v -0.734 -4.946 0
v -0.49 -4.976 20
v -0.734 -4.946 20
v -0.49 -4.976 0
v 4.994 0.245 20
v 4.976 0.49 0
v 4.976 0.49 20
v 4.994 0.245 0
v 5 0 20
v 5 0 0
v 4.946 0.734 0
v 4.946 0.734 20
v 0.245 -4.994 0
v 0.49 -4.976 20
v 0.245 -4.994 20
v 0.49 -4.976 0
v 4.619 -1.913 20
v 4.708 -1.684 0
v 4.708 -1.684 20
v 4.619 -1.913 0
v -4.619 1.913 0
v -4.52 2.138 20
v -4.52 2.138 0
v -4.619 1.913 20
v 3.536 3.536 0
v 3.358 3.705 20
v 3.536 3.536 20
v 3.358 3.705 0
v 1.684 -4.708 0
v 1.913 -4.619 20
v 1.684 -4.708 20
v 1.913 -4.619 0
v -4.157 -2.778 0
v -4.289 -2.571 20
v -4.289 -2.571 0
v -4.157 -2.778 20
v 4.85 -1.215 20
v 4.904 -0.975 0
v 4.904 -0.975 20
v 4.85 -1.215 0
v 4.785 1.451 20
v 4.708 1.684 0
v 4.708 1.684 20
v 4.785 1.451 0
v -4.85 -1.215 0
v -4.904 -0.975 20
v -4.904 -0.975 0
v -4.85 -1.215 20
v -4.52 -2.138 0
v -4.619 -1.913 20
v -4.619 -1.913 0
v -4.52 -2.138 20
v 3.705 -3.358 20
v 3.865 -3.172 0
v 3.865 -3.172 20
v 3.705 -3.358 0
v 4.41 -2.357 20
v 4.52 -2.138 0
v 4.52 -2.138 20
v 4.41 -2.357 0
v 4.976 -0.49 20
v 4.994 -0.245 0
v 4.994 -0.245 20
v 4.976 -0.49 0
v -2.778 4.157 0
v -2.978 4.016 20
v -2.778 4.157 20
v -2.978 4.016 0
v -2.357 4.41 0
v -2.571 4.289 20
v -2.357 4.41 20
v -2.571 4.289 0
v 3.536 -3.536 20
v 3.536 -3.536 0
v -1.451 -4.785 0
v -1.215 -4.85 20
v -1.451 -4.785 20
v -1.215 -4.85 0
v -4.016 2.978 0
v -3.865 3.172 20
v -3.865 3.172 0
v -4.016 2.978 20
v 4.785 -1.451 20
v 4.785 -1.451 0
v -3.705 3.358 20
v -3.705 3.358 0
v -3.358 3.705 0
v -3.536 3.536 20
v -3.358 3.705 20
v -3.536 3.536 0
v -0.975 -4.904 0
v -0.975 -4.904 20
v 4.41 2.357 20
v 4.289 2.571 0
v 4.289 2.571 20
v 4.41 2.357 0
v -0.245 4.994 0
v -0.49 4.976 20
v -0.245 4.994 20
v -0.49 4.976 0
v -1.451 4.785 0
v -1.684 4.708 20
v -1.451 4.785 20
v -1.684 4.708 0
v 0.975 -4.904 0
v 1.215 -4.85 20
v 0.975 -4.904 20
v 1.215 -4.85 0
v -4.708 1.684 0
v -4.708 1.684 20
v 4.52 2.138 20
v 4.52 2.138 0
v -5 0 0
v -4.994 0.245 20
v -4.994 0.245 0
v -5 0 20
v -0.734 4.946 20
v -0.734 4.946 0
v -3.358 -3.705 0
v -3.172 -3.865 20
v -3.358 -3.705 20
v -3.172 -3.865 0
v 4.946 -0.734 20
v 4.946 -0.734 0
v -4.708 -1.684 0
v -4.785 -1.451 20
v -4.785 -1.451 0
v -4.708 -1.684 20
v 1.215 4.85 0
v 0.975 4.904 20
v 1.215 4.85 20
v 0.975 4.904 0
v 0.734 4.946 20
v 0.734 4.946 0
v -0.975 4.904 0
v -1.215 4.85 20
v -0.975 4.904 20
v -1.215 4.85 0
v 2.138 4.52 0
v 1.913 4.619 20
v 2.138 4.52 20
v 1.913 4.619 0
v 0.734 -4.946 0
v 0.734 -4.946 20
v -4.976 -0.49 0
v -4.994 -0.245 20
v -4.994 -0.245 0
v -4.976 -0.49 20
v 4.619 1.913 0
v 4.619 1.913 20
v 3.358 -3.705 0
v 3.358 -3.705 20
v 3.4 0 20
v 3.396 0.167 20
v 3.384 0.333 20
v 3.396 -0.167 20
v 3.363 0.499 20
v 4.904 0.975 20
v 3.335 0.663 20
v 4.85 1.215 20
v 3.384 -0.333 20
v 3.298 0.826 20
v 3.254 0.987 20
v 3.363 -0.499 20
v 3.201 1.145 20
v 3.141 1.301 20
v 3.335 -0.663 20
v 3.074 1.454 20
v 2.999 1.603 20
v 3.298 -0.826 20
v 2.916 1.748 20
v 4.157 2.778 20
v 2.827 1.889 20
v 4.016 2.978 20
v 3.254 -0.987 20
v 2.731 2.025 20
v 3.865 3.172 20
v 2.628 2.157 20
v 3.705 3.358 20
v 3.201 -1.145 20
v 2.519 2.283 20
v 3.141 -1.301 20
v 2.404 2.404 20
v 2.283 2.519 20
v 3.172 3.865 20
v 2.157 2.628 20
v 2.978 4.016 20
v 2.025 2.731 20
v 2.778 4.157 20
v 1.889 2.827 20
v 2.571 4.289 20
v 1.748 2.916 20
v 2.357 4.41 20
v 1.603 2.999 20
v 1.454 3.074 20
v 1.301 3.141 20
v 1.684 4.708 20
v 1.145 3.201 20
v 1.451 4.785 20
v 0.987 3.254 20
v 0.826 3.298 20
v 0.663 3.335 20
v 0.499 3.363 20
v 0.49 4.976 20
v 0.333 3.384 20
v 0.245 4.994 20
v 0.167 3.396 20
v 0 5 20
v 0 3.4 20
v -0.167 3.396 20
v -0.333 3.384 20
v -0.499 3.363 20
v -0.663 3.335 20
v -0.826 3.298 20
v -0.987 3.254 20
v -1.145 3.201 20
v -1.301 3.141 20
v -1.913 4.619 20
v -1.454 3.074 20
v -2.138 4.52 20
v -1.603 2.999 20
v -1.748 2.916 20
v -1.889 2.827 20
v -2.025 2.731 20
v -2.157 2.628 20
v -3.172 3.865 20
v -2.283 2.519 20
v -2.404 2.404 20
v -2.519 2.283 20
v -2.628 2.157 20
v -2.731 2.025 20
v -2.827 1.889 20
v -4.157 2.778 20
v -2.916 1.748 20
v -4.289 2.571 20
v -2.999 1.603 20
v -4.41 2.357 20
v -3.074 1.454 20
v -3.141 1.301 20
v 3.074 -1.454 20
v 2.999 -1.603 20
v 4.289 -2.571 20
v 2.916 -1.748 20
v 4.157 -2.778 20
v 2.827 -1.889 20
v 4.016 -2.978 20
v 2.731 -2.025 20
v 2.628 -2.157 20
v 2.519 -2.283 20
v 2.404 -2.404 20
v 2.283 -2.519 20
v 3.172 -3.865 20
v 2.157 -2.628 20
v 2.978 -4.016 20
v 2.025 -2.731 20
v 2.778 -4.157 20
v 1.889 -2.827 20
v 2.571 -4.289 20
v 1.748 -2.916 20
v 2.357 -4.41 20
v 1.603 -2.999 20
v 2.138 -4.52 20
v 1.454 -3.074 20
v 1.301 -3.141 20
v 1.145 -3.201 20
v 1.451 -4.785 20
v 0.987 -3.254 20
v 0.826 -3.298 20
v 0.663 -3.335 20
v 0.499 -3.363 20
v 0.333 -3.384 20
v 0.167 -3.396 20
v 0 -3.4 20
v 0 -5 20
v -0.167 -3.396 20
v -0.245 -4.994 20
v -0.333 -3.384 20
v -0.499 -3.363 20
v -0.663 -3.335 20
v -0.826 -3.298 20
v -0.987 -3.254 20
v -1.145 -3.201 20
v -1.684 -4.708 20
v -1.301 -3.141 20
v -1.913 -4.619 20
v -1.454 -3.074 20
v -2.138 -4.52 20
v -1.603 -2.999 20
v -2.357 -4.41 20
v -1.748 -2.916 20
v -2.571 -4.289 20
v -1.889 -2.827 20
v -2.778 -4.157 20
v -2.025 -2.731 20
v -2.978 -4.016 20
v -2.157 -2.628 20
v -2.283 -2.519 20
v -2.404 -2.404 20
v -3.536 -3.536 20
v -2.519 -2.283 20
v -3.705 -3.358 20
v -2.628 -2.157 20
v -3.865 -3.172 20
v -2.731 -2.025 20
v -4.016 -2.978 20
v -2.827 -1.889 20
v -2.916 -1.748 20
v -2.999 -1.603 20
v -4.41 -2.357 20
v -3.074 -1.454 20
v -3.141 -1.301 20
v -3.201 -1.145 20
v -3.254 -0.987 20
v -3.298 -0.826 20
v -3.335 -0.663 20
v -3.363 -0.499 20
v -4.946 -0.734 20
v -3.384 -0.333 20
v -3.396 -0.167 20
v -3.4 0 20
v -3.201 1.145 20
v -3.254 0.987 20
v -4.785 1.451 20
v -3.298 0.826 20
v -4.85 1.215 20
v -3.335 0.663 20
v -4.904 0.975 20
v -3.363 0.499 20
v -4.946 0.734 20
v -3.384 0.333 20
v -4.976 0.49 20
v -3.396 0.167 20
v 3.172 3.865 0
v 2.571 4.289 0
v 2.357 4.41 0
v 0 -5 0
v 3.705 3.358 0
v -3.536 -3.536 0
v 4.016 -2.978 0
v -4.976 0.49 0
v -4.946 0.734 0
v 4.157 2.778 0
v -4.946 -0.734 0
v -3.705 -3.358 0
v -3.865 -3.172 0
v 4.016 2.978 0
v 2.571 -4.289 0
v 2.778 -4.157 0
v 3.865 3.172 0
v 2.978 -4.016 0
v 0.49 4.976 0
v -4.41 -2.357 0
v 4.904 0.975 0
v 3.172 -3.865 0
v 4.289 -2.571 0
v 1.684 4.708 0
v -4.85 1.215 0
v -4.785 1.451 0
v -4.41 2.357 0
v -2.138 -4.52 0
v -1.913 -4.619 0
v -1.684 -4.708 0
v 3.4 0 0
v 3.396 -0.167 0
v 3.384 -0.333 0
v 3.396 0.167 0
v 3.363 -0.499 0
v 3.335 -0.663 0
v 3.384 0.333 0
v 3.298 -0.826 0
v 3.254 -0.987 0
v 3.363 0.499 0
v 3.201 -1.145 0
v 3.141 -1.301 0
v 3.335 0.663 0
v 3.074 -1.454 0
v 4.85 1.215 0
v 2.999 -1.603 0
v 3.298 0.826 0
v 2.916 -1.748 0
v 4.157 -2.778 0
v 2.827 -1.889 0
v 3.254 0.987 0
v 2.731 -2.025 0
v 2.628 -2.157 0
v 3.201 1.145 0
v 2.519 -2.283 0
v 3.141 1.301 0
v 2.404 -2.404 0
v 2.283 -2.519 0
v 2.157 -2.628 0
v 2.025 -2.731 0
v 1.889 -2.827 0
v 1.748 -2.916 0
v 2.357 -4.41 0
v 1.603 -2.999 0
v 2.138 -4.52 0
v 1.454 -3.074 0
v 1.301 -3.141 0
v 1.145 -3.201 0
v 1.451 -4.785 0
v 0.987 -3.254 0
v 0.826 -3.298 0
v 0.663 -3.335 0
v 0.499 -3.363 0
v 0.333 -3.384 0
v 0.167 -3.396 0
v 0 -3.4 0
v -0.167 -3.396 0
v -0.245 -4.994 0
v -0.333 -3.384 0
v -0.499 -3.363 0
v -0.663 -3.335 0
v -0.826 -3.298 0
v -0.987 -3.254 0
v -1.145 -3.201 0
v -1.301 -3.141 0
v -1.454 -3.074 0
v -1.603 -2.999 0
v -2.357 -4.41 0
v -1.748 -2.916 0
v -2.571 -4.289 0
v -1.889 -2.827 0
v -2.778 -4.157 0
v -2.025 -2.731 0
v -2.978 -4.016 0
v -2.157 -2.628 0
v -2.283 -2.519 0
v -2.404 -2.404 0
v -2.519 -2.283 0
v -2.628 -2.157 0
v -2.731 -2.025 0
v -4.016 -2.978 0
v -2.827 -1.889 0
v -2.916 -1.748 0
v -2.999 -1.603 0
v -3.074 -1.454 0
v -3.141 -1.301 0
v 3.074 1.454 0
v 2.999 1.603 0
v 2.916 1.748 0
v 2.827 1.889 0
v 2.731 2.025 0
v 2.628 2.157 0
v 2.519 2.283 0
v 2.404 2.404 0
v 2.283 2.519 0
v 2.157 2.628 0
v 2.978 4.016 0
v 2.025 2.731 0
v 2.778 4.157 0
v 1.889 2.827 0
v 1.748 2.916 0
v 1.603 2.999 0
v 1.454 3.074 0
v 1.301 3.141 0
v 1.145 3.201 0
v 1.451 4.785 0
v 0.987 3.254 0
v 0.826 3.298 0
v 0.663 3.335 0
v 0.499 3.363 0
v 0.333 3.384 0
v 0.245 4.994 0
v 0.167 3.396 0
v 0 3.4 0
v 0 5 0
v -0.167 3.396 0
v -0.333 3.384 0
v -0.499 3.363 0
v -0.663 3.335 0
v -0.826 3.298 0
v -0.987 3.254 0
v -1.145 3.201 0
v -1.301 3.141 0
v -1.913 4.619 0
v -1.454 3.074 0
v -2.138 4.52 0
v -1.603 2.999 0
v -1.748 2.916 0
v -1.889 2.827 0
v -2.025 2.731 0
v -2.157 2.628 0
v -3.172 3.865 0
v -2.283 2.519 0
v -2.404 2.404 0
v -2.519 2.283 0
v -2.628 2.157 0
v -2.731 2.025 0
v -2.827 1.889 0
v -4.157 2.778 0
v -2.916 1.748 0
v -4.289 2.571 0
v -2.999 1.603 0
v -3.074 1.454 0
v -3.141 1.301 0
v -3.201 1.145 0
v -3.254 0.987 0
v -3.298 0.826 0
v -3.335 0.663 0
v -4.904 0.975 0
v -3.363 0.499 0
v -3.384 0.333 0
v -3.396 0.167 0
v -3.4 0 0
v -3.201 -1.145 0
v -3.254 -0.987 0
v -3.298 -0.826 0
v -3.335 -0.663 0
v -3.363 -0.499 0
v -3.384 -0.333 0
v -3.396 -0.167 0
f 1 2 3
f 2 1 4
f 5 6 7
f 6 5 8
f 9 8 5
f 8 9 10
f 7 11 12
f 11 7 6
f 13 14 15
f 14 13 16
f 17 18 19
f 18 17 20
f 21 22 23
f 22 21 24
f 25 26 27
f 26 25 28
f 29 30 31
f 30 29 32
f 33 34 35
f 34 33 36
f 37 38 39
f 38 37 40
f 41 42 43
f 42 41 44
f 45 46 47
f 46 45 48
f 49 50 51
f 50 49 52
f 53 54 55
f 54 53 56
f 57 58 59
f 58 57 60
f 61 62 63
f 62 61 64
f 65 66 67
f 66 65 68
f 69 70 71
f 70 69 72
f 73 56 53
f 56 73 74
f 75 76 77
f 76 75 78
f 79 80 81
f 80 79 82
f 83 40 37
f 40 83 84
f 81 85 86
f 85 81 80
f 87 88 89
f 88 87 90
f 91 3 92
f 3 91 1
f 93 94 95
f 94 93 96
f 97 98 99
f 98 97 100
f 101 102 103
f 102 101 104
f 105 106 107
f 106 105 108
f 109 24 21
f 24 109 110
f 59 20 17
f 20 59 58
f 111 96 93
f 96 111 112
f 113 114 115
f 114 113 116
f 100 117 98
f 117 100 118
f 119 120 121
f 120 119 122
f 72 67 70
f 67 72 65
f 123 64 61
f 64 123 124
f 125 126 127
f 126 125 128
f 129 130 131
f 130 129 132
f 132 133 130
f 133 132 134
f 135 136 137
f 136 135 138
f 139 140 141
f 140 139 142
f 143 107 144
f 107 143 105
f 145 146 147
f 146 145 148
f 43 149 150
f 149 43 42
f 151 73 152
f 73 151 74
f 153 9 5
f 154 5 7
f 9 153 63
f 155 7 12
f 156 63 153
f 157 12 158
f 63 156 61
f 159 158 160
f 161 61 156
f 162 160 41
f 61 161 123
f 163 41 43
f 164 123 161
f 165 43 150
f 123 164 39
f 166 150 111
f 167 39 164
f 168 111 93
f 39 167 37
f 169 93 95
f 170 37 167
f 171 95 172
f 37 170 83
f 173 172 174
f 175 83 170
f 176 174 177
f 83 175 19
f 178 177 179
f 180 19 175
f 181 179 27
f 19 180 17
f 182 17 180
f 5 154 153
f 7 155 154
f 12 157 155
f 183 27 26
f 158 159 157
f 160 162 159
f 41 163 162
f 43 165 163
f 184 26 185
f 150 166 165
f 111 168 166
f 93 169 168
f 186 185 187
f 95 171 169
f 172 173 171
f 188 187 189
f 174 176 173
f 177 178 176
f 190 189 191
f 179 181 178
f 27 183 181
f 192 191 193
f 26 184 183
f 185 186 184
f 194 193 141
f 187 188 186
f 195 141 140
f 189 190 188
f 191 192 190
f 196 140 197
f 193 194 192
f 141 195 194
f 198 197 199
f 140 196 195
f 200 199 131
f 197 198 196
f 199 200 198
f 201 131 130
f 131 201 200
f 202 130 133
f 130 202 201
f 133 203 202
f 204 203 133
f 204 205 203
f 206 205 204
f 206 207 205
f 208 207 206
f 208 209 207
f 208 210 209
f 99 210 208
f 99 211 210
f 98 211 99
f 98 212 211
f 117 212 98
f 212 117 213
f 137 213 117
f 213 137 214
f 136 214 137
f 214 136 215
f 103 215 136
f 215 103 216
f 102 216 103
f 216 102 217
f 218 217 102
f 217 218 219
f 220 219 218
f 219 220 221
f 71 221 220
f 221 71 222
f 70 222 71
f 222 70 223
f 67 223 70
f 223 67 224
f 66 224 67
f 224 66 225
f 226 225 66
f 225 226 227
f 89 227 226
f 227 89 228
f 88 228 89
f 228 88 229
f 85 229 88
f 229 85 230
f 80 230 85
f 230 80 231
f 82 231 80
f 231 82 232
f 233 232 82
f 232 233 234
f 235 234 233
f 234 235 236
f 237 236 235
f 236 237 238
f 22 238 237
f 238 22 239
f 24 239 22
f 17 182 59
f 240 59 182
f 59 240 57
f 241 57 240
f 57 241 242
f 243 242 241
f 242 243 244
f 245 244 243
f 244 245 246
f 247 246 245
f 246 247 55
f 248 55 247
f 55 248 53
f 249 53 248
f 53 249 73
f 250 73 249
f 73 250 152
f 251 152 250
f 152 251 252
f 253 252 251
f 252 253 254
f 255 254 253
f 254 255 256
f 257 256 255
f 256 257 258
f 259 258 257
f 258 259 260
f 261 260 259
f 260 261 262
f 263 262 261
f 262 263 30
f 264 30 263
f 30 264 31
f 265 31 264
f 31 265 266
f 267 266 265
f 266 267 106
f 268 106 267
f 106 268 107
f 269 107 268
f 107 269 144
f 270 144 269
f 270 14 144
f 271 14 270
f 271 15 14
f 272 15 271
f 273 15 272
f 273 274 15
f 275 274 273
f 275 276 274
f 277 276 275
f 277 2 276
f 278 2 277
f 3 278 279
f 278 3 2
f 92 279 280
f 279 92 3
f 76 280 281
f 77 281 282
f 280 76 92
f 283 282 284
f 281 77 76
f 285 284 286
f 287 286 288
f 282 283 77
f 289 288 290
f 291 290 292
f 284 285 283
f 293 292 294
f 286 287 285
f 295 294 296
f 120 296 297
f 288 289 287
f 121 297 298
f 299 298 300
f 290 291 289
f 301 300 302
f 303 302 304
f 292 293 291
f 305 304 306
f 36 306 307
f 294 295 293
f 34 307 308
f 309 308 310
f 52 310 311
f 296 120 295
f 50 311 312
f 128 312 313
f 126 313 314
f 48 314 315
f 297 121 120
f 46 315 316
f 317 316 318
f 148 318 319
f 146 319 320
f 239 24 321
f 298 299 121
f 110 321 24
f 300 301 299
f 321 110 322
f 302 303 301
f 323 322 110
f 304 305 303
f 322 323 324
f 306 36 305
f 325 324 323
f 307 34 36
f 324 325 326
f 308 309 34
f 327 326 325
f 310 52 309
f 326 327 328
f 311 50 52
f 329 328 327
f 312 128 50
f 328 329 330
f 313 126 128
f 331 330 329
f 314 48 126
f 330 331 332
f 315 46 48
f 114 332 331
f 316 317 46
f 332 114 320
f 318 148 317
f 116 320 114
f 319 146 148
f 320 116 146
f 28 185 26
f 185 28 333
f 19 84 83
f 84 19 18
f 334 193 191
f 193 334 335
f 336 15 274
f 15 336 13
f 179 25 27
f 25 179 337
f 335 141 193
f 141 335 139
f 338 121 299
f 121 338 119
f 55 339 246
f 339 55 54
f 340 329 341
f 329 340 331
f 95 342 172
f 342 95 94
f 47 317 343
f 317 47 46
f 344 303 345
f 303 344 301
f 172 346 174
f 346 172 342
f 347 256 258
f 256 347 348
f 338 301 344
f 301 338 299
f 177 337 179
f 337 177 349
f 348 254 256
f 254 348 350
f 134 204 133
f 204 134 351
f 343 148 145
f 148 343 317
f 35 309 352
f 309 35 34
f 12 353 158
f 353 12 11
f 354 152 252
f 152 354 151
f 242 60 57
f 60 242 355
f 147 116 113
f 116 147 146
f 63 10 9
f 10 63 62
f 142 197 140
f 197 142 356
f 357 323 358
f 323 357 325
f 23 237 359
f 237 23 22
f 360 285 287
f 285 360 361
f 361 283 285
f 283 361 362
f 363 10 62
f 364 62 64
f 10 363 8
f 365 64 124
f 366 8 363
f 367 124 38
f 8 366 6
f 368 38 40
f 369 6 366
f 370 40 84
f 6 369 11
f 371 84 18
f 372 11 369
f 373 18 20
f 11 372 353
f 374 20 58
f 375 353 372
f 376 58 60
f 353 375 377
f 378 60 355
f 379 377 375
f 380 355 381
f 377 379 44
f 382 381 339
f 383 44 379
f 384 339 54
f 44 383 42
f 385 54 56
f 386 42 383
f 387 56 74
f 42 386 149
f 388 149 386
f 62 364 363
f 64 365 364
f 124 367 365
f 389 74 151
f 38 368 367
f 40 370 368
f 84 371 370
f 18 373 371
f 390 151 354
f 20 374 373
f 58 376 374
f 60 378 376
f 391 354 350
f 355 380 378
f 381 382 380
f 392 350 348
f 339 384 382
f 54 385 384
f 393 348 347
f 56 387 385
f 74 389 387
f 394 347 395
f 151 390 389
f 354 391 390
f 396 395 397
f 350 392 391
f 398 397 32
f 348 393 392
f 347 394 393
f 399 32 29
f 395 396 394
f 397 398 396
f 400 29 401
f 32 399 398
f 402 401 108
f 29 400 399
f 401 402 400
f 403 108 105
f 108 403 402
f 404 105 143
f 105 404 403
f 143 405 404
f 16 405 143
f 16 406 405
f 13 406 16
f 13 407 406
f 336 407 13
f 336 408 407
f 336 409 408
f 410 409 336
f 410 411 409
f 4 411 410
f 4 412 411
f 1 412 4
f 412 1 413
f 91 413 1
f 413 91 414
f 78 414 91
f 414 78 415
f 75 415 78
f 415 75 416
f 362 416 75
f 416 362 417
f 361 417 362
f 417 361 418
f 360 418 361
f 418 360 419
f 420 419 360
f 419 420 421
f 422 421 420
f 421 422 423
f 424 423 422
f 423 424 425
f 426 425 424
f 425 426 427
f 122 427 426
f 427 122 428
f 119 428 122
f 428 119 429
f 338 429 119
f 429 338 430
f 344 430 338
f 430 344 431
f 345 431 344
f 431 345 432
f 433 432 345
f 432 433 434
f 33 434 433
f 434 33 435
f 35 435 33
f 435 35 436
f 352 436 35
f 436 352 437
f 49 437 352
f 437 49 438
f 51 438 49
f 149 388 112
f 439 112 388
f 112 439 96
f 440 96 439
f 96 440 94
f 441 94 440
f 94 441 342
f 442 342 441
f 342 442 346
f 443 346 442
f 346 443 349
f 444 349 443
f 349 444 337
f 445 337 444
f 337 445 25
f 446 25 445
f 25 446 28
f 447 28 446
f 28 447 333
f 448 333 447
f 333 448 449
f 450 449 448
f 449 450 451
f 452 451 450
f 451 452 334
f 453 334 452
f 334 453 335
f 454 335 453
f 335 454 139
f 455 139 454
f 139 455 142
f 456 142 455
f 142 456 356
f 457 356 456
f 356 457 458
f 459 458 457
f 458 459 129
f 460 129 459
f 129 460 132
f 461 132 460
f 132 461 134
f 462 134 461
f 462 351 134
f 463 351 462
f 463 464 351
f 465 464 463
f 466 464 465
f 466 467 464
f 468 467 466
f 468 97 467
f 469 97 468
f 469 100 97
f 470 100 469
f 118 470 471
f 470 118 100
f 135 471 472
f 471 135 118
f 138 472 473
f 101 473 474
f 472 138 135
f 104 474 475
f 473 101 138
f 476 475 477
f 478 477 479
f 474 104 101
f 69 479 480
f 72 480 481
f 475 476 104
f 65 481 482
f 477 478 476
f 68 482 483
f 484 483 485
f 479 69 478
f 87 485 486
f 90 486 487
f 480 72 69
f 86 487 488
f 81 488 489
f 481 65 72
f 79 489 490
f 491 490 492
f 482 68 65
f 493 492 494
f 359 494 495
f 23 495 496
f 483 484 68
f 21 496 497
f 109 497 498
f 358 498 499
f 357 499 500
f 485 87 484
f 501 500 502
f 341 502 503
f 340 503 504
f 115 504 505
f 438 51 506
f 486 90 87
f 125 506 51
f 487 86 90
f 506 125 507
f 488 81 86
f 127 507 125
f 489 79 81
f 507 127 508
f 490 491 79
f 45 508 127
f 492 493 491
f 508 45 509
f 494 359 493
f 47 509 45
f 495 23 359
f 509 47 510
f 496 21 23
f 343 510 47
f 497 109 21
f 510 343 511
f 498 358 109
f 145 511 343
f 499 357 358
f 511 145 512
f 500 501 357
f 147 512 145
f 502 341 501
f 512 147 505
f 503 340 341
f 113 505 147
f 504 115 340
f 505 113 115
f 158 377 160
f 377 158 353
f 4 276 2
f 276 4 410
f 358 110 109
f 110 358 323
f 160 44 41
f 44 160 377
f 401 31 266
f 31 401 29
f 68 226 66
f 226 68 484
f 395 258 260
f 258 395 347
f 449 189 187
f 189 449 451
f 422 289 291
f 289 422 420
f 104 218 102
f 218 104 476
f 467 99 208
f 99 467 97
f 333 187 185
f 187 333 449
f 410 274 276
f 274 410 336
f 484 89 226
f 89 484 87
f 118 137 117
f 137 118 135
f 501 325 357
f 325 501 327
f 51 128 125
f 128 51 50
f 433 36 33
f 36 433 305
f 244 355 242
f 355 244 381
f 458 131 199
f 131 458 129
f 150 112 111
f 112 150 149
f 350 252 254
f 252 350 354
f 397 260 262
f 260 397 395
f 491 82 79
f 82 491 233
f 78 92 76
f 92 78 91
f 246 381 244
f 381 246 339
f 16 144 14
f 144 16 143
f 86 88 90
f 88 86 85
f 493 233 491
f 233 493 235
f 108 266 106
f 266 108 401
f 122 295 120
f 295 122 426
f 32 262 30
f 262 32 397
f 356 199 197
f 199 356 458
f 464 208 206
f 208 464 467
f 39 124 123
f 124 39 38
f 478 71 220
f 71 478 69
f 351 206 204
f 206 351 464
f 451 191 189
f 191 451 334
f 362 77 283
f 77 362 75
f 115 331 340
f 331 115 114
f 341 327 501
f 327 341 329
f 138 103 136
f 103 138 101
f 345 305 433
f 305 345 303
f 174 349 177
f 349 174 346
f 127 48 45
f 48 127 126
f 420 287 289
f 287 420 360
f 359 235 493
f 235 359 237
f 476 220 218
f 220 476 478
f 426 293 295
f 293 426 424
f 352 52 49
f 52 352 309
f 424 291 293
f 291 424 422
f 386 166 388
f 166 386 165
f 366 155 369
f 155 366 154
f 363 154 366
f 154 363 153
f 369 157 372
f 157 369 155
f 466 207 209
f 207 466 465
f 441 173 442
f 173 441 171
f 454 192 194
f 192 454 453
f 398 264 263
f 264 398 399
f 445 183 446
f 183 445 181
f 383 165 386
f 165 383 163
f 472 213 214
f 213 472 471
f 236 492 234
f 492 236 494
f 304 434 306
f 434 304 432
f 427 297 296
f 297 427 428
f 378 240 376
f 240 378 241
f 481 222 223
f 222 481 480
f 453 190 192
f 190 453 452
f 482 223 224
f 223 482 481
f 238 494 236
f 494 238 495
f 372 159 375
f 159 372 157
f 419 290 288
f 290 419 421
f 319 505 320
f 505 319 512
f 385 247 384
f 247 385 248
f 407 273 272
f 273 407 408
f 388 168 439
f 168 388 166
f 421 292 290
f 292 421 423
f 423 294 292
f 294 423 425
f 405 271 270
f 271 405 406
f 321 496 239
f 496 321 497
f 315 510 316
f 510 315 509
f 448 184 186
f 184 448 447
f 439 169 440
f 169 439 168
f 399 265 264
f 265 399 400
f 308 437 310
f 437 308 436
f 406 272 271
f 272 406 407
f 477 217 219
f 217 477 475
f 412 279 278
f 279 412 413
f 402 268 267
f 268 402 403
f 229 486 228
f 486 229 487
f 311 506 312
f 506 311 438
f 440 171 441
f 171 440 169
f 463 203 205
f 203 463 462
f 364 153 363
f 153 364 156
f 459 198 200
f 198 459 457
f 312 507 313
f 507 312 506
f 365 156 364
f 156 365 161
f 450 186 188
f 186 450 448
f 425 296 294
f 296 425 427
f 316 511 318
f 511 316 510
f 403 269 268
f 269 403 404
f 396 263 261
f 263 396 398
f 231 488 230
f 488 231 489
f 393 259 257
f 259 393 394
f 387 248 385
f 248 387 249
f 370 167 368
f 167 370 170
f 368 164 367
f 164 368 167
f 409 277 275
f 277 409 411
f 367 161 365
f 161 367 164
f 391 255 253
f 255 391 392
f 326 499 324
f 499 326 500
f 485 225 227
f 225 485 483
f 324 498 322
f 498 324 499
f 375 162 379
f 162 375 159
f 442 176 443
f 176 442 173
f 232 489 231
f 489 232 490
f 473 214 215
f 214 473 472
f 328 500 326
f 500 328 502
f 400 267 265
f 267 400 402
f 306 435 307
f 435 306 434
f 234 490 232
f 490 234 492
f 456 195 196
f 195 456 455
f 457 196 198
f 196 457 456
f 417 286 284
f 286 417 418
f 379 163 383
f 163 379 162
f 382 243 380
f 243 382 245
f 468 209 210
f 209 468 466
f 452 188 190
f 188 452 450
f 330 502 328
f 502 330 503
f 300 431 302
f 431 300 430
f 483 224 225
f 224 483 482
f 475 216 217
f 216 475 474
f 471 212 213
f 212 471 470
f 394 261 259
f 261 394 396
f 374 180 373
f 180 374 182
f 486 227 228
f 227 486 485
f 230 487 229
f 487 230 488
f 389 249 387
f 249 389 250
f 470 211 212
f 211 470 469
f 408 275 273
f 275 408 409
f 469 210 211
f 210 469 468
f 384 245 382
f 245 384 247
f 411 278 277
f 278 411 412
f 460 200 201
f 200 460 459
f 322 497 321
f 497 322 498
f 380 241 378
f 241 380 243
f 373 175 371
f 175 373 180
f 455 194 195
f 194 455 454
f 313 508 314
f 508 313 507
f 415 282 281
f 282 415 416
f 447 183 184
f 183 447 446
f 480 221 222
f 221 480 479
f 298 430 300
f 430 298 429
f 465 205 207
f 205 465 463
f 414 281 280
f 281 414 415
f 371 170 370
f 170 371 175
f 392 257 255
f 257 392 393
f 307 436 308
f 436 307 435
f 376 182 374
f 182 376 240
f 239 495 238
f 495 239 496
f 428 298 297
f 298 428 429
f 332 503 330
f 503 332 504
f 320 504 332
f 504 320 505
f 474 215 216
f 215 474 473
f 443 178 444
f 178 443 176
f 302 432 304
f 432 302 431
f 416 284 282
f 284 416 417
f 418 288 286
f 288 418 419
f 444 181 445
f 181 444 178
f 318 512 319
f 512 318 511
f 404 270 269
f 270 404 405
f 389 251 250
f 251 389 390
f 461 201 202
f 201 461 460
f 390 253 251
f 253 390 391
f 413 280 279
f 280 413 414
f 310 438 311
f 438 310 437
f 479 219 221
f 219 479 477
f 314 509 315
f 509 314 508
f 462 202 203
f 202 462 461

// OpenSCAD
// Lab Funnel Design
// Units: millimetres
// Orientation: Upright, wide opening at top, rests on XY plane at z=0

// Dimensions
$fn = 128; // High resolution for smooth curves

// Spout (Tube)
spout_outer_diameter = 10;
spout_inner_diameter = 6.8;
spout_length = 20;
spout_wall_thickness = 1.6;

// Cone (Funnel)
cone_bottom_diameter = 10; // Matches spout outer diameter
cone_top_diameter = 60;
cone_height = 30; // From z=20 to z=50

// Wall Thickness (applies to cone as well)
wall_thickness = 1.6;

// Derived Cone Dimensions
cone_bottom_inner_diameter = cone_bottom_diameter - (2 * wall_thickness);
cone_top_inner_diameter = cone_top_diameter - (2 * wall_thickness);

// Build the part
// We construct the solid by creating the outer shell and subtracting the inner void.
// The part sits on the XY plane at z=0.

difference() {
    // --- OUTER SHELL ---
    union() {
        // 1. Spout Outer Cylinder (z=0 to z=20)
        cylinder(
            h = spout_length,
            d = spout_outer_diameter,
            center = false
        );

        // 2. Cone Outer Frustum (z=20 to z=50)
        // Translate to start at z=20
        translate([0, 0, spout_length]) {
            // Linear extrusion of a triangle profile rotated 90 deg around Y to form cone
            // Profile: Base at z=0 (local) is cone_bottom_diameter, Top at z=cone_height is cone_top_diameter
            // We use polygon to define the cross-section in XZ plane, then rotate_extrude
            // Actually, simpler to use cylinder with varying radius? No, OpenSCAD cylinders are straight.
            // Use linear_extrude with a polygon profile in the XZ plane, then rotate 90 deg around Y.
            
            // Profile points: (x, z)
            // Bottom: x = cone_bottom_diameter/2, z = 0
            // Top: x = cone_top_diameter/2, z = cone_height
            // Close the loop for the outer wall? 
            // Let's build the outer cone as a solid frustum using linear_extrude of a triangle.
            
            polygon(
                points = [
                    [-cone_bottom_diameter/2, 0],
                    [cone_bottom_diameter/2, 0],
                    [cone_top_diameter/2, cone_height],
                    [-cone_top_diameter/2, cone_height]
                ],
                convex = false
            );
            
            rotate_extrude(
                axis = [0, 1, 0], // Rotate around Y axis
                angle = 360
            );
        }
    }

    // --- INNER VOID ---
    // We subtract the inner volume to create the bore.
    // The inner void consists of the inner cylinder and the inner cone frustum.
    
    union() {
        // 1. Inner Cylinder (Spout Bore)
        // z=0 to z=20
        cylinder(
            h = spout_length,
            d = spout_inner_diameter,
            center = false
        );

        // 2. Inner Cone Frustum
        // z=20 to z=50
        translate([0, 0, spout_length]) {
            // Profile for inner cone
            polygon(
                points = [
                    [-cone_bottom_inner_diameter/2, 0],
                    [cone_bottom_inner_diameter/2, 0],
                    [cone_top_inner_diameter/2, cone_height],
                    [-cone_top_inner_diameter/2, cone_height]
                ],
                convex = false
            );
            
            rotate_extrude(
                axis = [0, 1, 0],
                angle = 360
            );
        }
    }
}
